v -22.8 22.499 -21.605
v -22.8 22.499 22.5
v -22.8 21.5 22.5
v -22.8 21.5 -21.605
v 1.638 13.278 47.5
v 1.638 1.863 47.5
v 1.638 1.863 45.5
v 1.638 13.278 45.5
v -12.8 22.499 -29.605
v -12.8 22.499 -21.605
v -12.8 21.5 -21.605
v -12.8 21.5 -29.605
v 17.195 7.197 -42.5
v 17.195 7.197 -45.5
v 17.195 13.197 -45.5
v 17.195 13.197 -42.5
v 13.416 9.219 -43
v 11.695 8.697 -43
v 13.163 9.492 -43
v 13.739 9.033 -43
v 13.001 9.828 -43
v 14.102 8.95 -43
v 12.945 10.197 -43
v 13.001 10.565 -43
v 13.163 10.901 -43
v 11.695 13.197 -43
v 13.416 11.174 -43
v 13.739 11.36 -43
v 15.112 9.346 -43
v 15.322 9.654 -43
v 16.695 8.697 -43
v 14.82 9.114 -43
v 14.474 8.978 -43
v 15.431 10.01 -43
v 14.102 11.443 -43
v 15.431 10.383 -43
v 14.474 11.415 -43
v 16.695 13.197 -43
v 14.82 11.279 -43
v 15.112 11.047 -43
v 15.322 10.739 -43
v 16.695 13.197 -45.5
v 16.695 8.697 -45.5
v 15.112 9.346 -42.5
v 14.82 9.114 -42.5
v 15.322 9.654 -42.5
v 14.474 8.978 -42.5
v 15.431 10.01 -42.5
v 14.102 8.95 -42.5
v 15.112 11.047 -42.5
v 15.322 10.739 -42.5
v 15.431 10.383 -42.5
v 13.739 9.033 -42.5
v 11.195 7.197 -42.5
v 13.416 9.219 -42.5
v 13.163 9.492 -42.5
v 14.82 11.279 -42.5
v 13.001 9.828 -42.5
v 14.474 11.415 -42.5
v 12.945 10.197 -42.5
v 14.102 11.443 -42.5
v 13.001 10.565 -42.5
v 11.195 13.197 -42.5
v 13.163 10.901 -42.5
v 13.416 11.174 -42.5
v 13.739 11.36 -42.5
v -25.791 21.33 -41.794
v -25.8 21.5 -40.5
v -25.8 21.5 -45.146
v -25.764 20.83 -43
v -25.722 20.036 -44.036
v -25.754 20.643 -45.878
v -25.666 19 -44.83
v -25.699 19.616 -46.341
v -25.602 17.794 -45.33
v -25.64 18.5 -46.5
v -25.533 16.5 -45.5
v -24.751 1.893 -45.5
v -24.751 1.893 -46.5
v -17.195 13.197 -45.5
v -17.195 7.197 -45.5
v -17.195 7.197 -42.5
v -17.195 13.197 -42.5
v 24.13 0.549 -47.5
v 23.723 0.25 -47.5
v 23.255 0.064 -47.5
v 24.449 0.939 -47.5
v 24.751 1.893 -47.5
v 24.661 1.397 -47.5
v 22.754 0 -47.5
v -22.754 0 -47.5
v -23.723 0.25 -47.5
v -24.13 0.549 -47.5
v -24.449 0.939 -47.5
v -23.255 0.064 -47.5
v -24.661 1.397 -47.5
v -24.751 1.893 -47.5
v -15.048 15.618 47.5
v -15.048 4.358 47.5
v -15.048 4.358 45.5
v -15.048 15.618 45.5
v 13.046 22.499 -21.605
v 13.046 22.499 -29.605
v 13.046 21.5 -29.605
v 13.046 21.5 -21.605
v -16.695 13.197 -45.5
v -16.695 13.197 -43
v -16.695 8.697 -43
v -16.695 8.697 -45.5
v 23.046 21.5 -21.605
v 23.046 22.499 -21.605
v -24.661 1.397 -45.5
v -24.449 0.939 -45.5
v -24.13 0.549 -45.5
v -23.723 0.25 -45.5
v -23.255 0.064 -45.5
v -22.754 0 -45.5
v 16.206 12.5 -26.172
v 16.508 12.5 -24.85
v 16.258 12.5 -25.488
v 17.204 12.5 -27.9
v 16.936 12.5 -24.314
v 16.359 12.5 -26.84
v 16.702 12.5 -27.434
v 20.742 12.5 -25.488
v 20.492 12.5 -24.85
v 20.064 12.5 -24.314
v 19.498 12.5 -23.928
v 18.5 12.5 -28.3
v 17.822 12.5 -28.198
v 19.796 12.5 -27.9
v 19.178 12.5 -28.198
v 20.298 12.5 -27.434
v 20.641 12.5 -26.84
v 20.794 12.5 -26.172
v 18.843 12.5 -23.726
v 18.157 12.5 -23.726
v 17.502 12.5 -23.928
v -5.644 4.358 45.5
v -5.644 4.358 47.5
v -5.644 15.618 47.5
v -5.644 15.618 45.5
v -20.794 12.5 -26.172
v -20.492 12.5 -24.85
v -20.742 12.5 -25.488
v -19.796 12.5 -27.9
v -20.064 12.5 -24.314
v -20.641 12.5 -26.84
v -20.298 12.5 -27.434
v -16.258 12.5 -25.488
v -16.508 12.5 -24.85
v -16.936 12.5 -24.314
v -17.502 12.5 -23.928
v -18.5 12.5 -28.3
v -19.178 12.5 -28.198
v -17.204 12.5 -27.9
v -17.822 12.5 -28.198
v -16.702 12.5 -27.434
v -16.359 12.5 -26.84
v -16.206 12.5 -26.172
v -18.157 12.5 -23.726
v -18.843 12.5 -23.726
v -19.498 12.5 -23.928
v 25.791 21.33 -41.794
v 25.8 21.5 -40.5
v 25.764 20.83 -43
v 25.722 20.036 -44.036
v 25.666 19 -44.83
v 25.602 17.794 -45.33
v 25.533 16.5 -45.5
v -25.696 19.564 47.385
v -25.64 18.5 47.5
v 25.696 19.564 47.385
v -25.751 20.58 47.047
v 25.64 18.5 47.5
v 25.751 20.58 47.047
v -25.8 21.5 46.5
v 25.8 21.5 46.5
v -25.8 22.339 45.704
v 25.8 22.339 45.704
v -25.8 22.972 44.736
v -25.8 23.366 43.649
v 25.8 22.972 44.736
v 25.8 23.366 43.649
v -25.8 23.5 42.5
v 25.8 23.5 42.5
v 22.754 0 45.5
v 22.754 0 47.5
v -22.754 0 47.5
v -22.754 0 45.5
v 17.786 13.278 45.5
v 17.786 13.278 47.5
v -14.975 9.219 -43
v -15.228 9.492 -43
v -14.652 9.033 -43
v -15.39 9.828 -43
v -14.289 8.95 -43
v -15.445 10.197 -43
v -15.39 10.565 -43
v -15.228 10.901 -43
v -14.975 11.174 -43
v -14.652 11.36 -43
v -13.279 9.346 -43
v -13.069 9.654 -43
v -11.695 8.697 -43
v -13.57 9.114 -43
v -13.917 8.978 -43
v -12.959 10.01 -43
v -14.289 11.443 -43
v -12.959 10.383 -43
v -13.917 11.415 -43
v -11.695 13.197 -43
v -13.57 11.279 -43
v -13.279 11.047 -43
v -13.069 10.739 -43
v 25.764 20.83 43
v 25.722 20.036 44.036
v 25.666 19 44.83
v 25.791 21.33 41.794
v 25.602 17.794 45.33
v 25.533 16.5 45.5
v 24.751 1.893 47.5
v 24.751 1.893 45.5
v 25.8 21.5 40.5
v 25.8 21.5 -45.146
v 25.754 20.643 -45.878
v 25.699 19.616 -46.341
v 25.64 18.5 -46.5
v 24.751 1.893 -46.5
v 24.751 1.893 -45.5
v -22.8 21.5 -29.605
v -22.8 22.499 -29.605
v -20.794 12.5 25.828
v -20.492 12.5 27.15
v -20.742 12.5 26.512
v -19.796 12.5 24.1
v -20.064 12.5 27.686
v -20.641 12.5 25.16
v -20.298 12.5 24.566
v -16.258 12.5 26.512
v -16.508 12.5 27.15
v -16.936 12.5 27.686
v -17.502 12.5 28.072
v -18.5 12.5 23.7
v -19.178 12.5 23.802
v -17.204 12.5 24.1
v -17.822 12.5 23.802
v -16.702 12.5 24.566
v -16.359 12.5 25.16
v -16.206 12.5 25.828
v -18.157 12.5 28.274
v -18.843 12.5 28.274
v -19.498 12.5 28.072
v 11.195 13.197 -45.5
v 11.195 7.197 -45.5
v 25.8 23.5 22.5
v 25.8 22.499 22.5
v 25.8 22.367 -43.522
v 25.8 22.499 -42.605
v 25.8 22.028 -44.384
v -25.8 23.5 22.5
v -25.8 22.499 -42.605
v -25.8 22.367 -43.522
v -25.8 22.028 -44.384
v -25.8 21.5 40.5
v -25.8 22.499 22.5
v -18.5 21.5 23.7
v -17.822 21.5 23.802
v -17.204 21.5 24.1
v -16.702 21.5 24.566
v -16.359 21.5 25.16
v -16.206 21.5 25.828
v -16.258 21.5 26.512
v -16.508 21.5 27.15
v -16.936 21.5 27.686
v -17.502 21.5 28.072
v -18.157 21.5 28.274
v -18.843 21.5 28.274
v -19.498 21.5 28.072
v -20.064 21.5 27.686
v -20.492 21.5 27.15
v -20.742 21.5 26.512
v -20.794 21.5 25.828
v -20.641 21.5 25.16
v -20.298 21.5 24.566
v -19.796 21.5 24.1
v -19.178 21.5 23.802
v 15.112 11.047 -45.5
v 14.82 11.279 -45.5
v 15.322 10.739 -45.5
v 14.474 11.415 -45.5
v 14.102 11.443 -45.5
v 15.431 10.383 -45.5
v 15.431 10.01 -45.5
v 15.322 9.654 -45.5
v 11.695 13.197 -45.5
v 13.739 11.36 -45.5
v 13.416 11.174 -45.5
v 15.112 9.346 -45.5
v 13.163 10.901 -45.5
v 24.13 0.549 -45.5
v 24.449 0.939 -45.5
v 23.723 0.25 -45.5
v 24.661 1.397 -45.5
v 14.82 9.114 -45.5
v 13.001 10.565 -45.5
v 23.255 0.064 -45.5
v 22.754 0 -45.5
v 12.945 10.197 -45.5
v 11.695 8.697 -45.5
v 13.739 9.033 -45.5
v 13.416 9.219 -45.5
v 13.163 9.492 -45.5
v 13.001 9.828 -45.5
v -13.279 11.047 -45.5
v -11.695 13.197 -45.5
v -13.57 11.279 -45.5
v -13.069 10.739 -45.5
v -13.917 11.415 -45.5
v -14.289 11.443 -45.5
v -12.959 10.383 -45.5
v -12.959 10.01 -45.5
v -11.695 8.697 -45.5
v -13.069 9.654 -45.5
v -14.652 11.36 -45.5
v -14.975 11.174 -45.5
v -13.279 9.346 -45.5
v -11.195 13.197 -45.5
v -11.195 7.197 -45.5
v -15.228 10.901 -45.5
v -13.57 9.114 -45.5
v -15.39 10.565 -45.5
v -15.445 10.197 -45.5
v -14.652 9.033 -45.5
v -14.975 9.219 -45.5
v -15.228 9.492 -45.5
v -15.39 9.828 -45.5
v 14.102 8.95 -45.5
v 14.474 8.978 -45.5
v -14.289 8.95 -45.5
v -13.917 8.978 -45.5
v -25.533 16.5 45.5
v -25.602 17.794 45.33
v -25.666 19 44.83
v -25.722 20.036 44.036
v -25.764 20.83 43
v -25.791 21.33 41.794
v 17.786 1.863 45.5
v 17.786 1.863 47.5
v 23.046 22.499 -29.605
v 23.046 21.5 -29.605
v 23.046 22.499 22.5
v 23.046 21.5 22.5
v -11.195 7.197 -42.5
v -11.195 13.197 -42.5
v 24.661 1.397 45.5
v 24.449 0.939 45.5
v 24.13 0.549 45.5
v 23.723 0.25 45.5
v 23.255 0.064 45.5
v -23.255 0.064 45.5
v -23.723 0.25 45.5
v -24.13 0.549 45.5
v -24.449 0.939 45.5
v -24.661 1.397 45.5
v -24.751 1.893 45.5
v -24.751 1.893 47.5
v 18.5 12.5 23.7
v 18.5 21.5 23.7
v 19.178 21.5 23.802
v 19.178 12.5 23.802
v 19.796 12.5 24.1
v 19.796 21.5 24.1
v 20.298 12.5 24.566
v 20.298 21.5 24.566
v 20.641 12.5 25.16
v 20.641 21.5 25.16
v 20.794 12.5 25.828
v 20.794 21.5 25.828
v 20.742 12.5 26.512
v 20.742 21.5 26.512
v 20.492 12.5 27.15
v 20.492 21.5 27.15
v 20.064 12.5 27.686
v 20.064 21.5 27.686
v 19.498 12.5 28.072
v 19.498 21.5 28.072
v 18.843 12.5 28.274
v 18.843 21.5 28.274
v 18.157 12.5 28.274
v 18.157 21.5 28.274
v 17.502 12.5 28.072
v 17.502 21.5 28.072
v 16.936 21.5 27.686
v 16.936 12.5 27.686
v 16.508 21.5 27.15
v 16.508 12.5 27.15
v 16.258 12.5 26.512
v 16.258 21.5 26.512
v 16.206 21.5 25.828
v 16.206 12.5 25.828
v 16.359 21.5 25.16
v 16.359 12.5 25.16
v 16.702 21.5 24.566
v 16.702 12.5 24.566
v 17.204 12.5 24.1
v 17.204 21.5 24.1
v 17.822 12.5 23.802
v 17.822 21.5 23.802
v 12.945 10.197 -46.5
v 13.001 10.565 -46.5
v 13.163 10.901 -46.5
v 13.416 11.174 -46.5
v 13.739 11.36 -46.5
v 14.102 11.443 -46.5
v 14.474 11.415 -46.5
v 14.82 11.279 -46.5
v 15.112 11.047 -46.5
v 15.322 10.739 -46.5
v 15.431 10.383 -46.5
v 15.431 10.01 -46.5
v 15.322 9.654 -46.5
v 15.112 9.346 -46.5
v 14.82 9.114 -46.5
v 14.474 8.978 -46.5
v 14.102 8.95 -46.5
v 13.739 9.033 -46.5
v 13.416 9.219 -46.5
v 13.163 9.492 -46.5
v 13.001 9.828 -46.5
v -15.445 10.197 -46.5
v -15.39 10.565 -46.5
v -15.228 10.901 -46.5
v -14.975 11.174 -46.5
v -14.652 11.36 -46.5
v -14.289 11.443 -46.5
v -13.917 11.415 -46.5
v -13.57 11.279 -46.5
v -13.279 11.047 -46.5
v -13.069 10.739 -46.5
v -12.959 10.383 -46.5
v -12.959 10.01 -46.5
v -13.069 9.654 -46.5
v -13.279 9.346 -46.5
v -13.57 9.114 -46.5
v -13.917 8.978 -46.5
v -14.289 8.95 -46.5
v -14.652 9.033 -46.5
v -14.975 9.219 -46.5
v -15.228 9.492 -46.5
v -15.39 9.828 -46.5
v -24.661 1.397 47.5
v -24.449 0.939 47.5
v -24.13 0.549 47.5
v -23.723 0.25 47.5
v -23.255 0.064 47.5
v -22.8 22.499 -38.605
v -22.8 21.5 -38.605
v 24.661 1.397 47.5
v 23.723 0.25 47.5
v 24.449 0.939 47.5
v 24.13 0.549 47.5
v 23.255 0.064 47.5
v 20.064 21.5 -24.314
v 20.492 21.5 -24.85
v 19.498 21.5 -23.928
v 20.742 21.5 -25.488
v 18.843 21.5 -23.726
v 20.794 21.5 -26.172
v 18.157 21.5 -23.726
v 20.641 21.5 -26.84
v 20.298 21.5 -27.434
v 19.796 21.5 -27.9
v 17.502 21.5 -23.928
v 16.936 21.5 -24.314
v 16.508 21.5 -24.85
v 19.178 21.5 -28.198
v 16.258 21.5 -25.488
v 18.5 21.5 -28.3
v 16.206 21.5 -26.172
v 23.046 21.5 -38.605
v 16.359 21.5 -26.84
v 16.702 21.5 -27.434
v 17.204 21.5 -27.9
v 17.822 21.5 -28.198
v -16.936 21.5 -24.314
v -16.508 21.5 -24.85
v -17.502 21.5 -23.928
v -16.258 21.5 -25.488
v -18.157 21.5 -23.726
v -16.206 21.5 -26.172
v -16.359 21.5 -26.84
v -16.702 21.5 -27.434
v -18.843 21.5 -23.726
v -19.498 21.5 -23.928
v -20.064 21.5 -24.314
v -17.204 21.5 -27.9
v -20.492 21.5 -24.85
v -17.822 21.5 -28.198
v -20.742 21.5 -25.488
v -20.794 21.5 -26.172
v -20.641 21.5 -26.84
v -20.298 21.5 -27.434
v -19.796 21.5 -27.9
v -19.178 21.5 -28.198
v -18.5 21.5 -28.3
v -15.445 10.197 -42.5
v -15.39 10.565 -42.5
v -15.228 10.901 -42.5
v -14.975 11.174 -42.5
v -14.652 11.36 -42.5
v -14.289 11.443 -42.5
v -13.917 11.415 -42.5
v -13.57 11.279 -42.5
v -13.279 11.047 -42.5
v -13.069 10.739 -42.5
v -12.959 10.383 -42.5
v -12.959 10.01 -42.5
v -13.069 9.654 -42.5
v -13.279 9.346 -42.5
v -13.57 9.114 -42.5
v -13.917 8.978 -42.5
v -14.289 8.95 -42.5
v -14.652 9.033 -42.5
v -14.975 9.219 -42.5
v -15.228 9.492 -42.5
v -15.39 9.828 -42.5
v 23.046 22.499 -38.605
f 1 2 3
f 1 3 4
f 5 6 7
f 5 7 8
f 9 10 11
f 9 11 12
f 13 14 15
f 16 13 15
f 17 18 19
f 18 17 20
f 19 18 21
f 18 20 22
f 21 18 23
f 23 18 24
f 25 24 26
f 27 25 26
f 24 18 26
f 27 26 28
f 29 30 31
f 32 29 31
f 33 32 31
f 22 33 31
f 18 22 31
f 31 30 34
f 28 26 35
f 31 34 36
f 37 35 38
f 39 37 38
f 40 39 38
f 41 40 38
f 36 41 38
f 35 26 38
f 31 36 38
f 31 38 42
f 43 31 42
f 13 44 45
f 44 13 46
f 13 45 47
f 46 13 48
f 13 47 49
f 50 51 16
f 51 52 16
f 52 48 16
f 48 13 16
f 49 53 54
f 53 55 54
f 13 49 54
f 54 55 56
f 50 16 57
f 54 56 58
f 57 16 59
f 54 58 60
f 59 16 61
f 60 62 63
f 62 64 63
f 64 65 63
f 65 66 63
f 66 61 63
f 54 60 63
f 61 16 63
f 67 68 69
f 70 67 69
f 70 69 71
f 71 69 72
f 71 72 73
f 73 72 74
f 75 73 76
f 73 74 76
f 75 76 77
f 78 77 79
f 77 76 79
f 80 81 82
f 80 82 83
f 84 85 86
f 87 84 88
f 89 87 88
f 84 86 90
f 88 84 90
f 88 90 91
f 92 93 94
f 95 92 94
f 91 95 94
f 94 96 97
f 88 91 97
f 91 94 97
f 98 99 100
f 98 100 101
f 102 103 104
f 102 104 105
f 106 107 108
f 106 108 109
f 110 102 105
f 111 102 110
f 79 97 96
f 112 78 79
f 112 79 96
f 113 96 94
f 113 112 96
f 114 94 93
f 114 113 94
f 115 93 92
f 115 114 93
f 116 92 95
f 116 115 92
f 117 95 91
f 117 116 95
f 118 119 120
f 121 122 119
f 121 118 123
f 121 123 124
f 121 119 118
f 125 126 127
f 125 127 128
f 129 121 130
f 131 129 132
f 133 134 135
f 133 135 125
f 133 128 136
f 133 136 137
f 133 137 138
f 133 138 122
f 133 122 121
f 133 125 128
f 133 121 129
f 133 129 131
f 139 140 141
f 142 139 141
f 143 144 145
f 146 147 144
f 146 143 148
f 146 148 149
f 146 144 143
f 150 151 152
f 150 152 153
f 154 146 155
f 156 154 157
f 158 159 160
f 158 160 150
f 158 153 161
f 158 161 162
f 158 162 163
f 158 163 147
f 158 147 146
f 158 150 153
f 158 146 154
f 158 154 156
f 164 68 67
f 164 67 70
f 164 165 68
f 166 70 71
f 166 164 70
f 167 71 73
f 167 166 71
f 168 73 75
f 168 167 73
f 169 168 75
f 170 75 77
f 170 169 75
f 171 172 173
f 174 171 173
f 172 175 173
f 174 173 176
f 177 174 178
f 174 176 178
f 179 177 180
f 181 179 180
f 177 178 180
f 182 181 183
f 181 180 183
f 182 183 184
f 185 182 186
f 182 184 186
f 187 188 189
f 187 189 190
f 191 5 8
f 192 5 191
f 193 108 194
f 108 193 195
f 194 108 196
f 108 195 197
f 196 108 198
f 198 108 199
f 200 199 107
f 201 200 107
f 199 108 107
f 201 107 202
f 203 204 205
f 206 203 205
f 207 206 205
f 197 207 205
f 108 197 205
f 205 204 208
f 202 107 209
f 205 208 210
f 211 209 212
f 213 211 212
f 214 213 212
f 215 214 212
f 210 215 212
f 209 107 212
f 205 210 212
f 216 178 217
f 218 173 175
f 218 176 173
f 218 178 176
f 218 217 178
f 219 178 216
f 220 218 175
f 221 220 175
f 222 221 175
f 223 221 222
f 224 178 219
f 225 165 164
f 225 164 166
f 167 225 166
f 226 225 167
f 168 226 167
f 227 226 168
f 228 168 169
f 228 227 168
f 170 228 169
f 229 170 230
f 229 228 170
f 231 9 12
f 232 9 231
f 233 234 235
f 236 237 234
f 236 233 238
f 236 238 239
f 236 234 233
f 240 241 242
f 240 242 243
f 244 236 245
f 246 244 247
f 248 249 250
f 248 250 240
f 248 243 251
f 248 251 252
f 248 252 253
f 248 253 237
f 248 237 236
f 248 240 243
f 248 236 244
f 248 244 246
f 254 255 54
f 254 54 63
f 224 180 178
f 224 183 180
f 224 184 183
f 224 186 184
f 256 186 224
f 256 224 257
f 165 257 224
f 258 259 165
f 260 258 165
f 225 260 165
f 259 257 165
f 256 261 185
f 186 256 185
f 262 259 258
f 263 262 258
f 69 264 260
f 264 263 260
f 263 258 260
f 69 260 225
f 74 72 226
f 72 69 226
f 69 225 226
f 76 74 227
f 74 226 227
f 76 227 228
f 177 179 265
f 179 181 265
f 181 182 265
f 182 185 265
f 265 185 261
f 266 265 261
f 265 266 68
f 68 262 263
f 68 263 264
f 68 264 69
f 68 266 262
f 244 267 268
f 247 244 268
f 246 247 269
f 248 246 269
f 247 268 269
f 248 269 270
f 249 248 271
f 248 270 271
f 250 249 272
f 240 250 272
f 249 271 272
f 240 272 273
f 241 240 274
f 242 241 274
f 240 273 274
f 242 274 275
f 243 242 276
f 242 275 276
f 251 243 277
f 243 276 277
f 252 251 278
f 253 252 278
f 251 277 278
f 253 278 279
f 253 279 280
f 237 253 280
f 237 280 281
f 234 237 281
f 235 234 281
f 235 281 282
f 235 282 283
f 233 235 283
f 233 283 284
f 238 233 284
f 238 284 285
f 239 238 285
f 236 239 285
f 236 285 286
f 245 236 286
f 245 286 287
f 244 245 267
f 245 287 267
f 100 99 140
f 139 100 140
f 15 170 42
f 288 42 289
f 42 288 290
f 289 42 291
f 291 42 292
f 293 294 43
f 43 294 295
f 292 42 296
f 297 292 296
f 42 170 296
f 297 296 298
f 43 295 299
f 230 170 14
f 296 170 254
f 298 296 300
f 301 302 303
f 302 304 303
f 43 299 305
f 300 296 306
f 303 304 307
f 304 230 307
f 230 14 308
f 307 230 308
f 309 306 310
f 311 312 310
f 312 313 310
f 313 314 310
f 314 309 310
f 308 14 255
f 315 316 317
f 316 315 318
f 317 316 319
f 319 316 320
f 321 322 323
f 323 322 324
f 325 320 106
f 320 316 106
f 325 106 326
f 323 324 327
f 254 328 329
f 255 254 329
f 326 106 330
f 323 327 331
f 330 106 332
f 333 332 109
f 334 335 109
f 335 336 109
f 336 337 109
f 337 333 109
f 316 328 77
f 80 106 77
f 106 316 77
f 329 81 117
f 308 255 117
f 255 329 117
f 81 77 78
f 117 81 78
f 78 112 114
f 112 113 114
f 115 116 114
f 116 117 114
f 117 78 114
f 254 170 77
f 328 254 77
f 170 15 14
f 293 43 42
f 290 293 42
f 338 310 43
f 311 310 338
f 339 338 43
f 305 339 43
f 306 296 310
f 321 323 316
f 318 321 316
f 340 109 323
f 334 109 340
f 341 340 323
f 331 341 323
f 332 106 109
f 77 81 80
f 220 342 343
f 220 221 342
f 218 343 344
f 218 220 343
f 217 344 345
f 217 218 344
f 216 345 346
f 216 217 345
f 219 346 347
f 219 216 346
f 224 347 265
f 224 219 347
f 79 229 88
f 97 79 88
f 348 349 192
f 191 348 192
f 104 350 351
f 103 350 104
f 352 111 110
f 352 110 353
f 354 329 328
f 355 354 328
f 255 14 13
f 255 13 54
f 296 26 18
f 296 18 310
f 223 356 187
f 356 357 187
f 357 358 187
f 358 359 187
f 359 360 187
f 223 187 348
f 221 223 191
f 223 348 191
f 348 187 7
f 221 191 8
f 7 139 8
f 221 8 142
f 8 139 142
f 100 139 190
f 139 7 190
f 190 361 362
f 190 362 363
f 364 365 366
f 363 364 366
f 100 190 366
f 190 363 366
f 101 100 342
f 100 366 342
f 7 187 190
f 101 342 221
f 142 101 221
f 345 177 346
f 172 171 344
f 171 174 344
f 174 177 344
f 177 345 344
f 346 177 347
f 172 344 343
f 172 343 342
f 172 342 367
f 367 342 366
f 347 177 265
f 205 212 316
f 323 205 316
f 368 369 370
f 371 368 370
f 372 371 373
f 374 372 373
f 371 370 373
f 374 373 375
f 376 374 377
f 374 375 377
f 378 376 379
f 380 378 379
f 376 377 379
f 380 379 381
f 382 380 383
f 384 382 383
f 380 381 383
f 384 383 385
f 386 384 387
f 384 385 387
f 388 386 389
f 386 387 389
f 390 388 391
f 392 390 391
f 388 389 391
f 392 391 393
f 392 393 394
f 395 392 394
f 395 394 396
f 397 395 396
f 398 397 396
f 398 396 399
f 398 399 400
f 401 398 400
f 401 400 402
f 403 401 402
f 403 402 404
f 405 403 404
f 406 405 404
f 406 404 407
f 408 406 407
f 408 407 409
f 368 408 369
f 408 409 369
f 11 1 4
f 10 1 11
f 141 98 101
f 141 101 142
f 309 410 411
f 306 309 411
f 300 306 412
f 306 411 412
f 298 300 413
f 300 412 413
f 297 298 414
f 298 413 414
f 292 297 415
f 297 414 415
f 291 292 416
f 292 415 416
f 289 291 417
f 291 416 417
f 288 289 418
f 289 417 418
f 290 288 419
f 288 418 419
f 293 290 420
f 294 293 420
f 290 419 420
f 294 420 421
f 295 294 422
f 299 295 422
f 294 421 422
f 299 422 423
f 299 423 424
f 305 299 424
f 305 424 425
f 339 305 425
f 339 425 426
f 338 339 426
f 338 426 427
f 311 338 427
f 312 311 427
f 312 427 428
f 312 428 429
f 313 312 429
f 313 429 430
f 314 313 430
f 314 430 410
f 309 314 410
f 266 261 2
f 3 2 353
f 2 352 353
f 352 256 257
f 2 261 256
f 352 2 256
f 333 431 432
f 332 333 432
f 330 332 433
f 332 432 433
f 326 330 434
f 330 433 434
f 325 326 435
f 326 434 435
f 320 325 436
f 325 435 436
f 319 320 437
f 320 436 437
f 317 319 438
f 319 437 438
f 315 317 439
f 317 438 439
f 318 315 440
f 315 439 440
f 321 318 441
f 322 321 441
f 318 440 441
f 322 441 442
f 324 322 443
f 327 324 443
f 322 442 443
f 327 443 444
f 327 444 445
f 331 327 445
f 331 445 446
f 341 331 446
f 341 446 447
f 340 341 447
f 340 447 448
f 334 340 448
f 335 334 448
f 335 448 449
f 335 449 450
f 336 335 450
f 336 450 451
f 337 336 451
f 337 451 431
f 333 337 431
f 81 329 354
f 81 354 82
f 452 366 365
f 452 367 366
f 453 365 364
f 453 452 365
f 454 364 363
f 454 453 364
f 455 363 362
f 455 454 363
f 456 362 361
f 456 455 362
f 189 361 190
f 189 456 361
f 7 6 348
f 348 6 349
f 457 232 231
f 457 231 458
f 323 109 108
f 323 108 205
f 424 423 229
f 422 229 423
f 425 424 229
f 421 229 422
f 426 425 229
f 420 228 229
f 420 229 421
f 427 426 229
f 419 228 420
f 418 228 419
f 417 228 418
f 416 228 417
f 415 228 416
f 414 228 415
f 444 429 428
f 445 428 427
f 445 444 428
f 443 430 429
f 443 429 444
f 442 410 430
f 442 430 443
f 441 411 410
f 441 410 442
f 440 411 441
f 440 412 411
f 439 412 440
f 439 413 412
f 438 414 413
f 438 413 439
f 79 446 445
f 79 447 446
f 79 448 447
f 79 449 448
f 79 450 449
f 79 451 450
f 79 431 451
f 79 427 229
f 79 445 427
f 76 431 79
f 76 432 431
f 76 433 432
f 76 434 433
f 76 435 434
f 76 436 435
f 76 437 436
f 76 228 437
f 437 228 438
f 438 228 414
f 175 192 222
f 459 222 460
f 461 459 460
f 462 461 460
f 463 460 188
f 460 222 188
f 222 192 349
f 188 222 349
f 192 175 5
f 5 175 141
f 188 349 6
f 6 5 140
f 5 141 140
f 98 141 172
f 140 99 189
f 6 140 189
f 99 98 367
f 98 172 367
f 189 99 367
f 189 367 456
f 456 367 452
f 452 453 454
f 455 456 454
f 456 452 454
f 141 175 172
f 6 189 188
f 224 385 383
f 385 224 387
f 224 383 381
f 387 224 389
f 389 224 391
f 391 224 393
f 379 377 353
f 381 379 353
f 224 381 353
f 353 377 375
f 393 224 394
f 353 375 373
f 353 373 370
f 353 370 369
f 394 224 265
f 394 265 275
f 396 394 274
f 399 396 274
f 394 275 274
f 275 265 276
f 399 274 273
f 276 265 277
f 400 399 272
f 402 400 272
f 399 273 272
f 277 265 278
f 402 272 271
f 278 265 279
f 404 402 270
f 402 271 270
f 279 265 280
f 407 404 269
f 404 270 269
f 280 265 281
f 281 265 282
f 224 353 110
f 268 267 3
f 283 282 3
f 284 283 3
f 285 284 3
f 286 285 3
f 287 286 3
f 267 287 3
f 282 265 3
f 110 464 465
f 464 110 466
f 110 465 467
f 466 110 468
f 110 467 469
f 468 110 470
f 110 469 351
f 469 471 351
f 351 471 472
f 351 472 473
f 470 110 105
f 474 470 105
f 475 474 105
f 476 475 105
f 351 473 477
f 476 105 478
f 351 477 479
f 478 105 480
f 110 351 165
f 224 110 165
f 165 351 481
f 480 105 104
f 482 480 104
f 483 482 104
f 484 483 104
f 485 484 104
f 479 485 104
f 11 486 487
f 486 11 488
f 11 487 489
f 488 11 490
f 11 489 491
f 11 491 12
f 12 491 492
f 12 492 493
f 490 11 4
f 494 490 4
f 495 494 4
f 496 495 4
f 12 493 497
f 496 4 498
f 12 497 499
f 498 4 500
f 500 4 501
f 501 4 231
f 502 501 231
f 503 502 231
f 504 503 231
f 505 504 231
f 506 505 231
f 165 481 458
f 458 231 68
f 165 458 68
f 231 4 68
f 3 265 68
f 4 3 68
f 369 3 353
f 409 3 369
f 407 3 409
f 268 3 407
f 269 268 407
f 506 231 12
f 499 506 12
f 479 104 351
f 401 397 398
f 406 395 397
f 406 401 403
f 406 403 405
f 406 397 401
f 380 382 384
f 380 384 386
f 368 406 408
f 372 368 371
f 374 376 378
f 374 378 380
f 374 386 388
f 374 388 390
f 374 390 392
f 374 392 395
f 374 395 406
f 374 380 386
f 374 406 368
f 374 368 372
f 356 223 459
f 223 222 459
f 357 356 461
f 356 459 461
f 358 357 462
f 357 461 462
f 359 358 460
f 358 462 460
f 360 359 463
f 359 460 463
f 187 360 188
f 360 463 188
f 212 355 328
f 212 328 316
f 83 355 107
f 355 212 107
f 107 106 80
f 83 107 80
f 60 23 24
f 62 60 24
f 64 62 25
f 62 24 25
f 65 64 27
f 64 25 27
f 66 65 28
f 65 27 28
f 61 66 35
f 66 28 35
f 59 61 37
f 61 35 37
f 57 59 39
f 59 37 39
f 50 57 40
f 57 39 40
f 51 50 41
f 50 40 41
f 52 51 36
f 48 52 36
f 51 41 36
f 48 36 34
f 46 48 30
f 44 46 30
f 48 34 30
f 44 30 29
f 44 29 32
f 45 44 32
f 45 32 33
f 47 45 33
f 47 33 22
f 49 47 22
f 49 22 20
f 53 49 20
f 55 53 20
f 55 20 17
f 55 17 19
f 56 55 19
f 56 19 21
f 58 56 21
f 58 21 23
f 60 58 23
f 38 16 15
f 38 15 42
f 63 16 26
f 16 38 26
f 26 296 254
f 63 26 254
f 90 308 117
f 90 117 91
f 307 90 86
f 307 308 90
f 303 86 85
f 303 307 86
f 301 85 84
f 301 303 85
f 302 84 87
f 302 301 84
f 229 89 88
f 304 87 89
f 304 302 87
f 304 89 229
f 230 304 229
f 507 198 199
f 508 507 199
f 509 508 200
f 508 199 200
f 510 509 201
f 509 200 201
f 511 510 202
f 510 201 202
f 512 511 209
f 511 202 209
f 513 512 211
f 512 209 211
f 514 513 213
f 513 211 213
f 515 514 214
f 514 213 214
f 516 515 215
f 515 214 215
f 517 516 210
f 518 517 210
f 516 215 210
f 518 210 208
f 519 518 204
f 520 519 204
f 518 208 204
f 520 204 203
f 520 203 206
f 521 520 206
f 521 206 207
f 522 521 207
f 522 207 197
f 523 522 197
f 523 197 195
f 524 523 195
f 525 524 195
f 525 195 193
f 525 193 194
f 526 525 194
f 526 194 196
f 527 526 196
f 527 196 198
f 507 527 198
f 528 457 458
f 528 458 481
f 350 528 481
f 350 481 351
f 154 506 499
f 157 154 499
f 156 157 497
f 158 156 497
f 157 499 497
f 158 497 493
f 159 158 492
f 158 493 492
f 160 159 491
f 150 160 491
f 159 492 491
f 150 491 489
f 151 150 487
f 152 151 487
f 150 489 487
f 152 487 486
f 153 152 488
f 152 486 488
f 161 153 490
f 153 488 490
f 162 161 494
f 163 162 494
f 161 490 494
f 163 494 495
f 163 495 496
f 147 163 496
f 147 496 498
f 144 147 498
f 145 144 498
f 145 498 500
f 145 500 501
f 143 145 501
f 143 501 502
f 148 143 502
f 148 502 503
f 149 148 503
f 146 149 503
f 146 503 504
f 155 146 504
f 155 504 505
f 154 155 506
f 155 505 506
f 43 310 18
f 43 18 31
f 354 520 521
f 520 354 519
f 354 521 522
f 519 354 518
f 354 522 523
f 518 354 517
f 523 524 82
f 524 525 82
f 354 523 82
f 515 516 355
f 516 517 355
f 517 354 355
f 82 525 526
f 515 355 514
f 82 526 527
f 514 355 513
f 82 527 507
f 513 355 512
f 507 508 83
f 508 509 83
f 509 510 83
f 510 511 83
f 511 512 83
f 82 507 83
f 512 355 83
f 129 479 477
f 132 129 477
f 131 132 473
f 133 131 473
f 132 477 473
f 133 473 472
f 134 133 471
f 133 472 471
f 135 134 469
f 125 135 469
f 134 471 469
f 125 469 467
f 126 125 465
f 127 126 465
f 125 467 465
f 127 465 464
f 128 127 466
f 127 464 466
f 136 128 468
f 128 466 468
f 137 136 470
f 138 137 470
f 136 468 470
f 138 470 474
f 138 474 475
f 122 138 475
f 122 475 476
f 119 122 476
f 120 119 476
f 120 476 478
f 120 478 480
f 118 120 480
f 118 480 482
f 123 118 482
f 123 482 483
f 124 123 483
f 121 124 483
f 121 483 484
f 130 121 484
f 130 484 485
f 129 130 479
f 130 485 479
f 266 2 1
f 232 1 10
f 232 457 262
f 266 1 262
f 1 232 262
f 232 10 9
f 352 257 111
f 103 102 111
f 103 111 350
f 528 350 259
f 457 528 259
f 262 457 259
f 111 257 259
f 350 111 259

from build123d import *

# Parameters (mm, degrees)
BOSS_EXTRUDE1_DEPTH      = 25.8
BOSS_EXTRUDE1_DEPTH_BACK = 25.8
CUT_EXTRUDE2_DEPTH       = 105.5
FILLET3_R                = 2
FILLET2_R                = 5
SKETCH4_R                = 2.3
BOSS_EXTRUDE2_DEPTH      = 9
SKETCH8_W                = 9.403990972
SKETCH8_H                = 11.260041821
SKETCH8_W_2              = 16.148154032
SKETCH8_H_2              = 11.415373045
CUT_EXTRUDE5_DEPTH       = 10
CUT_EXTRUDE6_DEPTH       = 56
CUT_EXTRUDE7_DEPTH       = 56
SKETCH11_W               = 6
SKETCH11_H               = 6
BOSS_EXTRUDE3_DEPTH      = 4
SKETCH12_R               = 1.25
CUT_EXTRUDE8_DEPTH       = 7
SKETCH13_W               = 5
SKETCH13_H               = 2.5
CUT_EXTRUDE9_DEPTH       = 4.5


with BuildPart() as part:
    # Sketch1 → Boss-Extrude1 (new, two sides: drawn at the far end of the back side and taken through both)
    with BuildSketch(Plane(origin=(0, 0, 0), x_dir=(0, 0, -1), z_dir=(1, 0, 0)).offset(-BOSS_EXTRUDE1_DEPTH_BACK)):
        Polygon((-45.5, 0), (-45.5, 21.5), (45.5, 21.5), (45.5, 0), (47.5, 0), (47.5, 23.5), (-47.5, 23.5), (-47.5, 0), align=None)
    extrude(amount=BOSS_EXTRUDE1_DEPTH + BOSS_EXTRUDE1_DEPTH_BACK)

    # Sketch3 → Cut-Extrude2 (cut)
    with BuildSketch(Plane(origin=(0, 0, -47.5), x_dir=(-1, 0, 0), z_dir=(0, 0, -1))):
        Polygon((-25.8, 21.5), (-24.65, 0), (-25.8, 0), align=None)
        Polygon((25.8, 21.5), (24.65, 0), (25.8, 0), align=None)
    extrude(amount=-CUT_EXTRUDE2_DEPTH, mode=Mode.SUBTRACT)

    # Fillet3
    fillet3_edges = [part.edges().sort_by_distance(p)[0] for p in [
        (-24.65, 0, -46.5),
        (-24.65, 0, 46.5),
        (24.65, 0, 46.5),
        (24.65, 0, -46.5),
    ]]
    fillet(fillet3_edges, radius=FILLET3_R)

    # Fillet2
    fillet2_edges = [part.edges().sort_by_distance(p)[0] for p in [
        (0, 21.5, 45.5),
        (0, 23.5, 47.5),
        (0, 23.5, -47.5),
        (0, 21.5, -45.5),
    ]]
    fillet(fillet2_edges, radius=FILLET2_R)

    # Sketch4 → Boss-Extrude2 (add)
    with BuildSketch(Plane.XZ.offset(-21.5)):
        with Locations((-18.5, -26)):
            Circle(SKETCH4_R)
        with Locations((18.5, -26)):
            Circle(SKETCH4_R)
        with Locations((-18.5, 26)):
            Circle(SKETCH4_R)
        with Locations((18.5, 26)):
            Circle(SKETCH4_R)
    extrude(amount=BOSS_EXTRUDE2_DEPTH)

    # Sketch8 → Cut-Extrude5 (cut)
    with BuildSketch(Plane.XY.offset(47.5)):
        with Locations((-10.345619811, 9.988318774)):
            Rectangle(SKETCH8_W, SKETCH8_H)
        with Locations((9.712305605, 7.570757784)):
            Rectangle(SKETCH8_W_2, SKETCH8_H_2)
    extrude(amount=-CUT_EXTRUDE5_DEPTH, mode=Mode.SUBTRACT)

    # Sketch9 → Cut-Extrude6 (cut)
    with BuildSketch(Plane(origin=(25.8, 0, 0), x_dir=(0, 0, -1), z_dir=(1, 0, 0))):
        with BuildLine():
            Line((-22.5, 23.5), (-22.5, 22.498632165))
            Line((-22.5, 22.498632165), (42.604598318, 22.498632165))
            ThreePointArc((42.604598318, 22.498632165), (45.365169565, 21.291201061), (46.5, 18.5))
            Line((46.5, 18.5), (46.5, 1.893175959))
            Line((46.5, 1.893175959), (47.5, 1.893175959))
            Line((47.5, 1.893175959), (47.5, 18.5))
            ThreePointArc((47.5, 18.5), (46.035533906, 22.035533906), (42.5, 23.5))
            Line((42.5, 23.5), (-22.5, 23.5))
        make_face()
    extrude(amount=-CUT_EXTRUDE6_DEPTH, mode=Mode.SUBTRACT)

    # Sketch10 → Cut-Extrude7 (cut)
    with BuildSketch(Plane(origin=(0, 22.498632165, 0), x_dir=(1, 0, 0), z_dir=(0, 1, 0))):
        Polygon((-22.8, -22.5), (-22.8, 21.604598318), (-12.8, 21.604598318), (-12.8, 29.604598318), (-22.8, 29.604598318), (-22.8, 38.604598318), (23.045882962, 38.604598318), (23.045882962, 29.604598318), (13.045882962, 29.604598318), (13.045882962, 21.604598318), (23.045882962, 21.604598318), (23.045882962, -22.5), align=None)
    extrude(amount=-CUT_EXTRUDE7_DEPTH, mode=Mode.SUBTRACT)

    # Sketch11 → Boss-Extrude3 (add)
    with BuildSketch(Plane(origin=(0, 0, -46.5), x_dir=(-1, 0, 0), z_dir=(0, 0, -1))):
        with Locations((-14.195398892, 10.196587979)):
            Rectangle(SKETCH11_W, SKETCH11_H)
        with Locations((14.195398892, 10.196587979)):
            Rectangle(SKETCH11_W, SKETCH11_H)
    extrude(amount=-BOSS_EXTRUDE3_DEPTH)

    # Sketch12 → Cut-Extrude8 (cut)
    with BuildSketch(Plane(origin=(0, 0, -46.5), x_dir=(-1, 0, 0), z_dir=(0, 0, -1))):
        with Locations((14.195398892, 10.196587979)):
            Circle(SKETCH12_R)
        with Locations((-14.195398892, 10.196587979)):
            Circle(SKETCH12_R)
    extrude(amount=-CUT_EXTRUDE8_DEPTH, mode=Mode.SUBTRACT)

    # Sketch13 → Cut-Extrude9 (cut)
    with BuildSketch(Plane(origin=(0, 13.196587979, 0), x_dir=(1, 0, 0), z_dir=(0, 1, 0))):
        with Locations((14.195398892, 44.25)):
            Rectangle(SKETCH13_W, SKETCH13_H)
        with Locations((-14.195398892, 44.25)):
            Rectangle(SKETCH13_W, SKETCH13_H)
    extrude(amount=-CUT_EXTRUDE9_DEPTH, mode=Mode.SUBTRACT)


solid = part.part
